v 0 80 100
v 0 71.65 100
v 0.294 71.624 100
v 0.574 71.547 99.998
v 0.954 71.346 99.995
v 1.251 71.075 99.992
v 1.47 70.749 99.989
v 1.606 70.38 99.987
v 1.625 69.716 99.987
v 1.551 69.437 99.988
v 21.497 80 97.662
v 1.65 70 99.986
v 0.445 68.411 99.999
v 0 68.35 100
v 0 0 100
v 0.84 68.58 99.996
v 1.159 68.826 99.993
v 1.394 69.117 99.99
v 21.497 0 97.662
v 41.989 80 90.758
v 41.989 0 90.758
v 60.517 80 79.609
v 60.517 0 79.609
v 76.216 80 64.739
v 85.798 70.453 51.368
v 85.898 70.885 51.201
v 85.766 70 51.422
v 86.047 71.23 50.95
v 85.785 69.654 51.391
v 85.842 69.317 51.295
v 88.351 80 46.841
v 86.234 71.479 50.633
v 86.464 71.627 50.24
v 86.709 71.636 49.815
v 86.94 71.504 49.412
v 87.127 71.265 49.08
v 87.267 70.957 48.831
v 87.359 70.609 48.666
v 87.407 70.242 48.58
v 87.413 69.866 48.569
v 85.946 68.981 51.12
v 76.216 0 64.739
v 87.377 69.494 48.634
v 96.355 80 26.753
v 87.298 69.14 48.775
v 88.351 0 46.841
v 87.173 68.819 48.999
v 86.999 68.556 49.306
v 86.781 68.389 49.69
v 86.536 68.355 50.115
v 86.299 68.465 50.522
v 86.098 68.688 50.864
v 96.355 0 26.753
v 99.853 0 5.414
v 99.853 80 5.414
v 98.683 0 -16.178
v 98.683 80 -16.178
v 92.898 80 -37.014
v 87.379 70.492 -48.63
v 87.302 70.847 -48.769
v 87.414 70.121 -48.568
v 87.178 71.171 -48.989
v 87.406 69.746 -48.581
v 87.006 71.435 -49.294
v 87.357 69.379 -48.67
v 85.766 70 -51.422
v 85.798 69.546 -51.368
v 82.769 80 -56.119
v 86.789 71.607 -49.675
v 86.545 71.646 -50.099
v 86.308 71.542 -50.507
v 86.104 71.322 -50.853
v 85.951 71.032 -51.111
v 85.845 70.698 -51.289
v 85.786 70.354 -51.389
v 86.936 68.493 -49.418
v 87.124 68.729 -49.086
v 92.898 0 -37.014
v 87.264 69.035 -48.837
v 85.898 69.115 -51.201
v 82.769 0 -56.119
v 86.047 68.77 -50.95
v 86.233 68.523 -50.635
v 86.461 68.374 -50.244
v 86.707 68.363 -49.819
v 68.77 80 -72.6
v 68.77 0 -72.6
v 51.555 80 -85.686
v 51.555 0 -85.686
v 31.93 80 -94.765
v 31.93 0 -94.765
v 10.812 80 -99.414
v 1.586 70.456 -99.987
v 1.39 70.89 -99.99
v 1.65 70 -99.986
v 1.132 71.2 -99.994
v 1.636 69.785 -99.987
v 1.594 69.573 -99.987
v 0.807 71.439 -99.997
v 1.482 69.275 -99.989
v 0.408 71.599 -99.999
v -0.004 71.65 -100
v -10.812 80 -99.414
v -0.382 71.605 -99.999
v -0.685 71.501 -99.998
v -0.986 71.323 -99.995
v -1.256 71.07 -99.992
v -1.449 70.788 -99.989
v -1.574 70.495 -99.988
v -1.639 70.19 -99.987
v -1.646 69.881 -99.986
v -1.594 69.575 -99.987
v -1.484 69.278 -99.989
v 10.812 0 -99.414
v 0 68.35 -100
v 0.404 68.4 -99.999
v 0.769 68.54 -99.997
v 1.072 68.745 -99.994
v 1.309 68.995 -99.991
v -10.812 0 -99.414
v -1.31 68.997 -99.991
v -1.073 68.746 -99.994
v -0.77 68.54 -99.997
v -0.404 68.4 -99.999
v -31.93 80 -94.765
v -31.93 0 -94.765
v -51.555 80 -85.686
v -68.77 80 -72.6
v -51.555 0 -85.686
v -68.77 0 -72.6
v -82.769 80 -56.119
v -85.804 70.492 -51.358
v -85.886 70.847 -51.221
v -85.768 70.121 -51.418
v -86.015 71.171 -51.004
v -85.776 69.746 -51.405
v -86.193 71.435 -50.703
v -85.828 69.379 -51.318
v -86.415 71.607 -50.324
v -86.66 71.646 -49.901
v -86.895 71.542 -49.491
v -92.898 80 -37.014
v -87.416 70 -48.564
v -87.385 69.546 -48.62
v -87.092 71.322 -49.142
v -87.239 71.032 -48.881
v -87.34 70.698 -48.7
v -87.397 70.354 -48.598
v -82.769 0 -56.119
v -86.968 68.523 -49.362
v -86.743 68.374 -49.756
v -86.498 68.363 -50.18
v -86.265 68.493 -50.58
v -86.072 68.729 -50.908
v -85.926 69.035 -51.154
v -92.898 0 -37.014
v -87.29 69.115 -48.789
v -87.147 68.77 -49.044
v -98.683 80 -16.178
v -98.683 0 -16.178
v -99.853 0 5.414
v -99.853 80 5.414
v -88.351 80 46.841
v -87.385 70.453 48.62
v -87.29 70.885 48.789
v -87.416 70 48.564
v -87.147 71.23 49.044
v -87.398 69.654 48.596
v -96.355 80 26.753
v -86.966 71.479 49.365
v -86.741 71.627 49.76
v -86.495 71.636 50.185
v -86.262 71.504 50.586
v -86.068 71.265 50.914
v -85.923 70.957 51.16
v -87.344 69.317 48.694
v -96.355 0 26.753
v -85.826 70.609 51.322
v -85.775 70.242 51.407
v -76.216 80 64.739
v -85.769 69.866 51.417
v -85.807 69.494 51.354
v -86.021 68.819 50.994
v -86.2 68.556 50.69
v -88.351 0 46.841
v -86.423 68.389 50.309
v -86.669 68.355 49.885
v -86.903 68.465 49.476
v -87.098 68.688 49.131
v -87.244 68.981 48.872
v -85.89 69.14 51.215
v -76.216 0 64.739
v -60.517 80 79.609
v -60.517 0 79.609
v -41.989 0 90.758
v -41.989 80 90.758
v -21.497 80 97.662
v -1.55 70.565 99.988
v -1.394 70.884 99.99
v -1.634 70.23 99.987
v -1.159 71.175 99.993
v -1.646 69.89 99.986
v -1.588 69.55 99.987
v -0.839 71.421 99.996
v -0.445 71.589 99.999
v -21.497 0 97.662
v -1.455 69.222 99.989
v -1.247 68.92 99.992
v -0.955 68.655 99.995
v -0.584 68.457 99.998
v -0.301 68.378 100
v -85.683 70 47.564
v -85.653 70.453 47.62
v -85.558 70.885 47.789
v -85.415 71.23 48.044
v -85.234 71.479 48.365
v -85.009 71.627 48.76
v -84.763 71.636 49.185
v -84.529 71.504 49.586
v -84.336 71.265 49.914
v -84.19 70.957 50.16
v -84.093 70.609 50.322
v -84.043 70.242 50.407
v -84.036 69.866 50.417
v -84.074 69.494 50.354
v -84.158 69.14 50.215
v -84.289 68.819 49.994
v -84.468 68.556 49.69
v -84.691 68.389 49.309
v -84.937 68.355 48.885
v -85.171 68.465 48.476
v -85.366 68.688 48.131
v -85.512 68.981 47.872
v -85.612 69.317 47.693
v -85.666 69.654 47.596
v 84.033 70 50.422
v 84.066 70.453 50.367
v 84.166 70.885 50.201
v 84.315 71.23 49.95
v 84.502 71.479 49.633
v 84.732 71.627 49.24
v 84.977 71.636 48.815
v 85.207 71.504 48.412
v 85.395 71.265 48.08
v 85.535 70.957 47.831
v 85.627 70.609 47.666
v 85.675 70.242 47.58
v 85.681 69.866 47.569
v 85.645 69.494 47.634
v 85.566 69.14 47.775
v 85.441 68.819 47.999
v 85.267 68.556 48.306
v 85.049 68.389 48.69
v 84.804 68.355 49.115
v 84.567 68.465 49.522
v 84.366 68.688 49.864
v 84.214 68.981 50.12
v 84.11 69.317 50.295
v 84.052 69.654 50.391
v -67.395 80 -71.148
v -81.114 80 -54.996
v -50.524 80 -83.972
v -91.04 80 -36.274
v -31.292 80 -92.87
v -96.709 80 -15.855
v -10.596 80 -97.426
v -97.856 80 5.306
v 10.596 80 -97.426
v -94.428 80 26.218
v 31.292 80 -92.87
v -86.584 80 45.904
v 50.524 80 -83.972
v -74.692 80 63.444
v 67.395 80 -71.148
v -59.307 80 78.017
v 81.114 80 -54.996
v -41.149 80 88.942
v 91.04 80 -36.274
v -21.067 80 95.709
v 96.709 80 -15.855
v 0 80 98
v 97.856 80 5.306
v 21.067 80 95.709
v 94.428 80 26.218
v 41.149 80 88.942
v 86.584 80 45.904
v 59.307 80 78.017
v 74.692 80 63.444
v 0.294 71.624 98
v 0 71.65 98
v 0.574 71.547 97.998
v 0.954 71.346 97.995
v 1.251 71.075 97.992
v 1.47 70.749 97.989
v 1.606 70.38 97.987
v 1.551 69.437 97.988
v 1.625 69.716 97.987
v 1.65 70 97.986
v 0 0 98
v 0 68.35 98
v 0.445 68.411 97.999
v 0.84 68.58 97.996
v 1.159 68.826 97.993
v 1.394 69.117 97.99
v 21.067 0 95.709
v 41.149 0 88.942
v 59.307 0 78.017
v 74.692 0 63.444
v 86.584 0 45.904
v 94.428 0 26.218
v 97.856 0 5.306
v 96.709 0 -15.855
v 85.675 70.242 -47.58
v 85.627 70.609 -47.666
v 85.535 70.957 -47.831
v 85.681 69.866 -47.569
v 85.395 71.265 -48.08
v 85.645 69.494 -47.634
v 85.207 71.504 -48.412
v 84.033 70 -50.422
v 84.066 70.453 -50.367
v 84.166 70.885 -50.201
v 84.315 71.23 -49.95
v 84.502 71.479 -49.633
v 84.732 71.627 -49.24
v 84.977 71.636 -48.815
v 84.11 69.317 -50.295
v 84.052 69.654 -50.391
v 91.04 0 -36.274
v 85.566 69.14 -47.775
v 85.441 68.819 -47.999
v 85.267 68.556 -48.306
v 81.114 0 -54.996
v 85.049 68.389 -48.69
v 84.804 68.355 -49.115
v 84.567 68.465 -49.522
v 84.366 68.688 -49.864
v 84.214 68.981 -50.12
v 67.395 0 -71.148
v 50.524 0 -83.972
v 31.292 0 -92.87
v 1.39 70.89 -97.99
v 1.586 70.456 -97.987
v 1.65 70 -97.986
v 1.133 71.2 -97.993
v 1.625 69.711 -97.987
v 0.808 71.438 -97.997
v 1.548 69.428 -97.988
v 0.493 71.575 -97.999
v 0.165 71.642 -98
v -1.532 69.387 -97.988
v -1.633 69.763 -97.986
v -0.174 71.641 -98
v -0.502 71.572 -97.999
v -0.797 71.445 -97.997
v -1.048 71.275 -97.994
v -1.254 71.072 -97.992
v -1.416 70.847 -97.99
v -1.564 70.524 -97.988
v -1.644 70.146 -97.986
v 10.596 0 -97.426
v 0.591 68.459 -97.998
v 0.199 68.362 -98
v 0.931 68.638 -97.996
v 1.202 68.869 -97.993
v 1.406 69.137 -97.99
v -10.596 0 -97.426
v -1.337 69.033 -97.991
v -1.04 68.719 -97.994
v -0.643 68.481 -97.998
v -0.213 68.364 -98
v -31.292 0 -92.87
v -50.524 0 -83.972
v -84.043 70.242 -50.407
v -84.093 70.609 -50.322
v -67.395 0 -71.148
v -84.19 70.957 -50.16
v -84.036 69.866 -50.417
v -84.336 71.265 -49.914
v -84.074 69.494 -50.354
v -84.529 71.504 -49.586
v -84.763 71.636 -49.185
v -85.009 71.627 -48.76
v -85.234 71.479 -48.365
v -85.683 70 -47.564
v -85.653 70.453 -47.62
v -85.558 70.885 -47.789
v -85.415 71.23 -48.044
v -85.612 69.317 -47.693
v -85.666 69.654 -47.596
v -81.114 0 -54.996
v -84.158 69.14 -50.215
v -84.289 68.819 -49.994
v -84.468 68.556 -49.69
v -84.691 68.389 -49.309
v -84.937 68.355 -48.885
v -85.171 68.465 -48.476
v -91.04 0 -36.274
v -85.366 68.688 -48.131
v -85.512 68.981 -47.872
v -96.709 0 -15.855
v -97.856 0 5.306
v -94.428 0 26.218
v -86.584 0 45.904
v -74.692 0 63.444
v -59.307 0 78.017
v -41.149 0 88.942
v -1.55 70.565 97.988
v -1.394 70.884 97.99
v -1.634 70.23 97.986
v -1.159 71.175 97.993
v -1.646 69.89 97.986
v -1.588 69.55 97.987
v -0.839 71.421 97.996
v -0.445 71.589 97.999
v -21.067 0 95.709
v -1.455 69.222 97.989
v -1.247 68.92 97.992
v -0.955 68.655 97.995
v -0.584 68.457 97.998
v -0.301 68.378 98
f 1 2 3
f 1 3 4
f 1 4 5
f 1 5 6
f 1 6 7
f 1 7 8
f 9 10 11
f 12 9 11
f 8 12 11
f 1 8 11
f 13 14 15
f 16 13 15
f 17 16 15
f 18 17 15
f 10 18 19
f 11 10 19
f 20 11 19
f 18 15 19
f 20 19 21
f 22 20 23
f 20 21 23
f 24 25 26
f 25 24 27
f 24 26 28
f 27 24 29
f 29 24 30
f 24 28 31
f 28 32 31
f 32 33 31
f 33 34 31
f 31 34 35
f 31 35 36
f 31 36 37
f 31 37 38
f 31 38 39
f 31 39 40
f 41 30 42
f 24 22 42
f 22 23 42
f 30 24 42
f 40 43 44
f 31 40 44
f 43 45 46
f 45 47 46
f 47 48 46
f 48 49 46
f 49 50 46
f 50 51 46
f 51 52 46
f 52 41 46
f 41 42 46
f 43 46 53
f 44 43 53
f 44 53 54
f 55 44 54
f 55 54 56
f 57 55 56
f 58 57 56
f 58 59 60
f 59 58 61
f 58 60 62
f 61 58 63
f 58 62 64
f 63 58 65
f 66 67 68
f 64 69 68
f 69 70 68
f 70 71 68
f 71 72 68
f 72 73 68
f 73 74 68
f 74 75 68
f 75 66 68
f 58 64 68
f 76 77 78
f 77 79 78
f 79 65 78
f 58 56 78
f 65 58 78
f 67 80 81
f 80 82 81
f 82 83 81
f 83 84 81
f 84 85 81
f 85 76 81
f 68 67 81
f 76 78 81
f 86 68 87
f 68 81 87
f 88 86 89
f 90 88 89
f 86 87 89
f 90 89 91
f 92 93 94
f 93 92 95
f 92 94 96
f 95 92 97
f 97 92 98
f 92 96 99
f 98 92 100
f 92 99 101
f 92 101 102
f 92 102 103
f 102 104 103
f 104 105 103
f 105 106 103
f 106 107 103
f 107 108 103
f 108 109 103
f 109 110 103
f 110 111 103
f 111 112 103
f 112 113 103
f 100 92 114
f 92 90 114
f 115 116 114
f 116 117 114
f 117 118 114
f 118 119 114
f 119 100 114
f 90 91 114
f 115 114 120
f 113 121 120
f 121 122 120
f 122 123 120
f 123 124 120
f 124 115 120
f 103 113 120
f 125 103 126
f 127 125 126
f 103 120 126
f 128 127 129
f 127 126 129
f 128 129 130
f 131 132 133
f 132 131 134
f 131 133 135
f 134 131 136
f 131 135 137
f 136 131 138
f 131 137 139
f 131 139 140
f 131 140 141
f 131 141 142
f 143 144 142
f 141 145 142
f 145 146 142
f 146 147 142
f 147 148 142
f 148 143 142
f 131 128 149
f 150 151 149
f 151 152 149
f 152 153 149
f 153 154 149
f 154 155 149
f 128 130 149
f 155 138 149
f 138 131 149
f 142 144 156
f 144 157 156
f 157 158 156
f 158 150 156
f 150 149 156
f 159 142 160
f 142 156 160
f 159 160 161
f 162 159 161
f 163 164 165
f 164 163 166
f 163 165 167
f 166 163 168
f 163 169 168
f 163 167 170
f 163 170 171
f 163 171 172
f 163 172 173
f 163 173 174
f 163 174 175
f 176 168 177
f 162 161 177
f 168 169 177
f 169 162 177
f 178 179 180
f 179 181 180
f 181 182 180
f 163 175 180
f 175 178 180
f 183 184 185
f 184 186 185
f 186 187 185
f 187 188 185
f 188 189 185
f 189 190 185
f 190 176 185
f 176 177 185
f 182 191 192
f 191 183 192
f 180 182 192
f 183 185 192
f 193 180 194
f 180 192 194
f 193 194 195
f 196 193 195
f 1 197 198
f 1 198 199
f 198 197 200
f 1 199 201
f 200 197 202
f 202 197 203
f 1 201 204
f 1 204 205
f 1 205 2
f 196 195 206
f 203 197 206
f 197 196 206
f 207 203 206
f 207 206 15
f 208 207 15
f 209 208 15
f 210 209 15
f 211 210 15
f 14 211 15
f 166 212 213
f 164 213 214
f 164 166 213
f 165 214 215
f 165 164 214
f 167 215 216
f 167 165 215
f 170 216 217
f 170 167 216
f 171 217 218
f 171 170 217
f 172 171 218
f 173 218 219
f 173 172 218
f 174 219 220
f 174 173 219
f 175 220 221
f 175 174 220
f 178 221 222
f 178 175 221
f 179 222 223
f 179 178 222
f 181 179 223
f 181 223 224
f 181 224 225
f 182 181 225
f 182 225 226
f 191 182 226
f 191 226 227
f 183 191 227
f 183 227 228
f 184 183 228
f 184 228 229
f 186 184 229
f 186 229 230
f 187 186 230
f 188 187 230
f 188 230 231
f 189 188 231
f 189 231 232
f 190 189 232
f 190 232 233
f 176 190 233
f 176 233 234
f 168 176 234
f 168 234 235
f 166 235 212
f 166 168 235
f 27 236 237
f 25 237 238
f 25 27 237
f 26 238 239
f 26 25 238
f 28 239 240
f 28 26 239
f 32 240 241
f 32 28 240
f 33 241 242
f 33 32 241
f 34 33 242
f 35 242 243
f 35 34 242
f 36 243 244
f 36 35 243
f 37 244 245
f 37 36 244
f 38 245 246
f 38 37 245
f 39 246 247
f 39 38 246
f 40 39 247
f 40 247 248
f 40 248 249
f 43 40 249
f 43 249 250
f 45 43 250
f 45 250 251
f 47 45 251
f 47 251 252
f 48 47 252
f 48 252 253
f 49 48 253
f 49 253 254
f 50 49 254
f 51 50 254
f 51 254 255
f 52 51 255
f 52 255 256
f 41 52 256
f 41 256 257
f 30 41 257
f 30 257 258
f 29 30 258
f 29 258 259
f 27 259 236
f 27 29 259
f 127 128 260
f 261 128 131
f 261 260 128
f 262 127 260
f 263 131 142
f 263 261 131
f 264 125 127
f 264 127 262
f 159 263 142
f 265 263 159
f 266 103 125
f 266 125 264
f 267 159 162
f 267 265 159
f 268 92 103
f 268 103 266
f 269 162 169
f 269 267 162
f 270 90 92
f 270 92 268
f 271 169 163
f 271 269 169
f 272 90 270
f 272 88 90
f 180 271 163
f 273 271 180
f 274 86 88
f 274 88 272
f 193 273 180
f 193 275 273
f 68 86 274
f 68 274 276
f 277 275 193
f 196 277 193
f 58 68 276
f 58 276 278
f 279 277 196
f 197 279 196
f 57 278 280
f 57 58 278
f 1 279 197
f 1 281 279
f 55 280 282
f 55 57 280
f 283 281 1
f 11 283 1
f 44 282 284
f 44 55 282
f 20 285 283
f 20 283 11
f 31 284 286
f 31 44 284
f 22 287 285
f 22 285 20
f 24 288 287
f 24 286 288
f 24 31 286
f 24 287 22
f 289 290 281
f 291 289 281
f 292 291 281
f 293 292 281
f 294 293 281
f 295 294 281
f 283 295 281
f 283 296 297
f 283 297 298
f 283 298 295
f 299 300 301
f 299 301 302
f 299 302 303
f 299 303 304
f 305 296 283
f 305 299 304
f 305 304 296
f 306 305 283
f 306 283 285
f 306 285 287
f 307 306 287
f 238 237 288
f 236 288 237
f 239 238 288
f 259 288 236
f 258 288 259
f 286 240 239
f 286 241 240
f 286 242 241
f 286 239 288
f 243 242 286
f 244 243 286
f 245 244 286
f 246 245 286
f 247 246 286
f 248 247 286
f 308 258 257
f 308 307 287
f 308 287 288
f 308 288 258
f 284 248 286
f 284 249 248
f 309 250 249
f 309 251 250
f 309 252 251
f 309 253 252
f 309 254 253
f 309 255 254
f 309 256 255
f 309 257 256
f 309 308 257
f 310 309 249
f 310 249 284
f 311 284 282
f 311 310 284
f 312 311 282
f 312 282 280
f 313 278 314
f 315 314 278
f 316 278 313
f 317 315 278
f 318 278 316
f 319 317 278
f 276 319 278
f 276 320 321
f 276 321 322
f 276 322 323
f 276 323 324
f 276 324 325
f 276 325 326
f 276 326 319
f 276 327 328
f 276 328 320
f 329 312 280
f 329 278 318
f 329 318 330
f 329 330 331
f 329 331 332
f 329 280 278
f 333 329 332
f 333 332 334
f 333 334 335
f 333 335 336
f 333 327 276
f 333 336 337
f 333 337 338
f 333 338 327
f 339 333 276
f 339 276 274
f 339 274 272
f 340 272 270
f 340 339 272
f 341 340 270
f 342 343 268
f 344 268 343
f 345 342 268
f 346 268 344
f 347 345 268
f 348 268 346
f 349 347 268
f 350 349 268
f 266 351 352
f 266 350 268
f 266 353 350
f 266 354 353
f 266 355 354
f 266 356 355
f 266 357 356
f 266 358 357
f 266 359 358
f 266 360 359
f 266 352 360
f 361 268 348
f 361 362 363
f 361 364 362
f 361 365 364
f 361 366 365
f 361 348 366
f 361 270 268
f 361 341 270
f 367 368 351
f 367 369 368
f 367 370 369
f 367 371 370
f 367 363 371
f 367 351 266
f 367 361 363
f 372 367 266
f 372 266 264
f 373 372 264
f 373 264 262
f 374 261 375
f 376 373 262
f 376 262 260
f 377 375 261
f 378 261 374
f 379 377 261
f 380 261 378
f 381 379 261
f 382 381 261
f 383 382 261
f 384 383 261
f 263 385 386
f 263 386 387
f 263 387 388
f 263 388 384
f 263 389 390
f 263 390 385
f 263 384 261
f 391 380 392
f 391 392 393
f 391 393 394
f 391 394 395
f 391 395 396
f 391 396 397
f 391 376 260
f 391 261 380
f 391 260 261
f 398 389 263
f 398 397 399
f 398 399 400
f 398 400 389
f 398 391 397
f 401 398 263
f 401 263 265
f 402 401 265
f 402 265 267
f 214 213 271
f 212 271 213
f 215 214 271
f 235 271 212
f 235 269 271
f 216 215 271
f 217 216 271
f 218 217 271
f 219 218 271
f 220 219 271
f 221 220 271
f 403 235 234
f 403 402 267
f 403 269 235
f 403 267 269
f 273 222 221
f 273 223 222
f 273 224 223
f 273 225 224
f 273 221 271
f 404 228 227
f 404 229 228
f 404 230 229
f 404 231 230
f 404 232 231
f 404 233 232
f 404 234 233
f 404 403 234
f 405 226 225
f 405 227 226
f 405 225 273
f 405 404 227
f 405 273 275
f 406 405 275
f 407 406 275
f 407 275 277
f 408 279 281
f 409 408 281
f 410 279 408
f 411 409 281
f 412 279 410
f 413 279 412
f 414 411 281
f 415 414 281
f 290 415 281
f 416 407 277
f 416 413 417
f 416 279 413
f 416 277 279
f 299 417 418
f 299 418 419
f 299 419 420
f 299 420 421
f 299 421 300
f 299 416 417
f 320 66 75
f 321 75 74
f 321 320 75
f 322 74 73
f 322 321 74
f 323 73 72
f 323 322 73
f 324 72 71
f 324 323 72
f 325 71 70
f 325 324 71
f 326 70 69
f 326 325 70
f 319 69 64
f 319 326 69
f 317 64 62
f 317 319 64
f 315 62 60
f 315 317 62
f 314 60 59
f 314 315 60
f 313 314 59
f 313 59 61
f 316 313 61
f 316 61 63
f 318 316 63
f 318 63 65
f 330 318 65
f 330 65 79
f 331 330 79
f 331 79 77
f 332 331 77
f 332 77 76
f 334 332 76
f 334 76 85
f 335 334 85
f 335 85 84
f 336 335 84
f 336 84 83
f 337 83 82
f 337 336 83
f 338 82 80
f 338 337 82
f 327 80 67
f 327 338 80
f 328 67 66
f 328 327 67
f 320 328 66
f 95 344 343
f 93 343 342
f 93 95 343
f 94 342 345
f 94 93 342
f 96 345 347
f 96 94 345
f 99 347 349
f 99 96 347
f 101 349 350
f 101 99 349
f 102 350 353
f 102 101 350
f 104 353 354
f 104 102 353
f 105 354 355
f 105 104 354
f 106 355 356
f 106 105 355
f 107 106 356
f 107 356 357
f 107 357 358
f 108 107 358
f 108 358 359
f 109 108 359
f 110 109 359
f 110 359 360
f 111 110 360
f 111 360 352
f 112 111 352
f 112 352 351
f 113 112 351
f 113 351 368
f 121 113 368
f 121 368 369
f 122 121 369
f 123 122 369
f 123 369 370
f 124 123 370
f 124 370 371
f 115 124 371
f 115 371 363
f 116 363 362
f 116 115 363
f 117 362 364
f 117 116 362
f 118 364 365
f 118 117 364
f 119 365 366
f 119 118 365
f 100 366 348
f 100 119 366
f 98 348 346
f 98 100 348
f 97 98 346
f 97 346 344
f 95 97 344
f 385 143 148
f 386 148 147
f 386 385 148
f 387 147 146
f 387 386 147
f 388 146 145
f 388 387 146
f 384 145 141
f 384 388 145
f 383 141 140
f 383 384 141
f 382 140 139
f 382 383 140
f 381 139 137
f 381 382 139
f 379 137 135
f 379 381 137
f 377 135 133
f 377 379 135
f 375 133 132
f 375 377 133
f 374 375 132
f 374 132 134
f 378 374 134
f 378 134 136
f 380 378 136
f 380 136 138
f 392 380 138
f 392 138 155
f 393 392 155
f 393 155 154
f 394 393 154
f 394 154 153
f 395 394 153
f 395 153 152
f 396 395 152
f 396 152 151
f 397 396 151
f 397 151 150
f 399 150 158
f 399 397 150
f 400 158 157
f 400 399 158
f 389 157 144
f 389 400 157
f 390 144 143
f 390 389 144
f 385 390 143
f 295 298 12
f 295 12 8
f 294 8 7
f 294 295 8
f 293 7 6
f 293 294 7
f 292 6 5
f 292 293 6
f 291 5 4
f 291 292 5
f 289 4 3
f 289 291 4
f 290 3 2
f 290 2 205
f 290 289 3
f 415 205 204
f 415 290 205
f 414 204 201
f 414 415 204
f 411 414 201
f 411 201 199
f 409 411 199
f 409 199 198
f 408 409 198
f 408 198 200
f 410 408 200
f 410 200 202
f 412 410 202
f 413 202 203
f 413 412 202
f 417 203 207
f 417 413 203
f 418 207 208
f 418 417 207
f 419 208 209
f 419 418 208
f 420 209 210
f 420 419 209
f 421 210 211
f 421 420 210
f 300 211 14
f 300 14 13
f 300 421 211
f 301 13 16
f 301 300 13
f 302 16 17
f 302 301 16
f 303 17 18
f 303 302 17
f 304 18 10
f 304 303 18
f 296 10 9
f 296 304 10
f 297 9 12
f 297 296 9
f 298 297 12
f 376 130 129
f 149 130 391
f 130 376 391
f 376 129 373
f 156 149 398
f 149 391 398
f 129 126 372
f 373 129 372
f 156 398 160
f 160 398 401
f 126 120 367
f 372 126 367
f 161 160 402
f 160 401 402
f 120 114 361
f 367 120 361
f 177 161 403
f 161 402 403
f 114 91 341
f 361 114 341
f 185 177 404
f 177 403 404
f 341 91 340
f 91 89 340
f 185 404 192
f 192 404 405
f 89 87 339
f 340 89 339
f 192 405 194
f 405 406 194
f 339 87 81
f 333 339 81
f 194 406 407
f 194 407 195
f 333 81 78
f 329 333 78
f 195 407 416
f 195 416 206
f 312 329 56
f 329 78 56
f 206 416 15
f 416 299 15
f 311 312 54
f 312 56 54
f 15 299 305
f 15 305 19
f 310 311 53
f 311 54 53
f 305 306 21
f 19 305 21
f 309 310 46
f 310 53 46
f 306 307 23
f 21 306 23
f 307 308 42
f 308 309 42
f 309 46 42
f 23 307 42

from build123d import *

# Parameters (mm, degrees)
SKETCH1_R           = 100
SKETCH1_R_2         = 98
BOSS_EXTRUDE1_DEPTH = 80
F_3DSKETCH1_R       = 1.65
CUT_EXTRUDE1_DEPTH  = 158.797338381
CIRPATTERN1_COUNT   = 3


with BuildPart() as part:
    # Sketch1 → Boss-Extrude1 (new body)
    with BuildSketch(Plane(origin=(0, 0, 0), x_dir=(1, 0, 0), z_dir=(0, 1, 0))):
        Circle(SKETCH1_R)
        Circle(SKETCH1_R_2, mode=Mode.SUBTRACT)
    extrude(amount=BOSS_EXTRUDE1_DEPTH)

    # 3DSketch1 → Cut-Extrude1 (cut, symmetric)
    with BuildSketch(Plane(origin=(0, 70, 0), x_dir=(1, 0, 0), z_dir=(0, 0, 1))):
        Circle(F_3DSKETCH1_R)
    cut_extrude1 = extrude(amount=CUT_EXTRUDE1_DEPTH, both=True, mode=Mode.SUBTRACT)

    # CirPattern1: Cut-Extrude1 ×3 about axis
    cirpattern1_axis = Axis((0, 80, 0), (0, -1, 0))
    for i in range(1, CIRPATTERN1_COUNT):
        add(cut_extrude1.rotate(cirpattern1_axis, i * 360 / CIRPATTERN1_COUNT), mode=Mode.SUBTRACT)


solid = part.part
